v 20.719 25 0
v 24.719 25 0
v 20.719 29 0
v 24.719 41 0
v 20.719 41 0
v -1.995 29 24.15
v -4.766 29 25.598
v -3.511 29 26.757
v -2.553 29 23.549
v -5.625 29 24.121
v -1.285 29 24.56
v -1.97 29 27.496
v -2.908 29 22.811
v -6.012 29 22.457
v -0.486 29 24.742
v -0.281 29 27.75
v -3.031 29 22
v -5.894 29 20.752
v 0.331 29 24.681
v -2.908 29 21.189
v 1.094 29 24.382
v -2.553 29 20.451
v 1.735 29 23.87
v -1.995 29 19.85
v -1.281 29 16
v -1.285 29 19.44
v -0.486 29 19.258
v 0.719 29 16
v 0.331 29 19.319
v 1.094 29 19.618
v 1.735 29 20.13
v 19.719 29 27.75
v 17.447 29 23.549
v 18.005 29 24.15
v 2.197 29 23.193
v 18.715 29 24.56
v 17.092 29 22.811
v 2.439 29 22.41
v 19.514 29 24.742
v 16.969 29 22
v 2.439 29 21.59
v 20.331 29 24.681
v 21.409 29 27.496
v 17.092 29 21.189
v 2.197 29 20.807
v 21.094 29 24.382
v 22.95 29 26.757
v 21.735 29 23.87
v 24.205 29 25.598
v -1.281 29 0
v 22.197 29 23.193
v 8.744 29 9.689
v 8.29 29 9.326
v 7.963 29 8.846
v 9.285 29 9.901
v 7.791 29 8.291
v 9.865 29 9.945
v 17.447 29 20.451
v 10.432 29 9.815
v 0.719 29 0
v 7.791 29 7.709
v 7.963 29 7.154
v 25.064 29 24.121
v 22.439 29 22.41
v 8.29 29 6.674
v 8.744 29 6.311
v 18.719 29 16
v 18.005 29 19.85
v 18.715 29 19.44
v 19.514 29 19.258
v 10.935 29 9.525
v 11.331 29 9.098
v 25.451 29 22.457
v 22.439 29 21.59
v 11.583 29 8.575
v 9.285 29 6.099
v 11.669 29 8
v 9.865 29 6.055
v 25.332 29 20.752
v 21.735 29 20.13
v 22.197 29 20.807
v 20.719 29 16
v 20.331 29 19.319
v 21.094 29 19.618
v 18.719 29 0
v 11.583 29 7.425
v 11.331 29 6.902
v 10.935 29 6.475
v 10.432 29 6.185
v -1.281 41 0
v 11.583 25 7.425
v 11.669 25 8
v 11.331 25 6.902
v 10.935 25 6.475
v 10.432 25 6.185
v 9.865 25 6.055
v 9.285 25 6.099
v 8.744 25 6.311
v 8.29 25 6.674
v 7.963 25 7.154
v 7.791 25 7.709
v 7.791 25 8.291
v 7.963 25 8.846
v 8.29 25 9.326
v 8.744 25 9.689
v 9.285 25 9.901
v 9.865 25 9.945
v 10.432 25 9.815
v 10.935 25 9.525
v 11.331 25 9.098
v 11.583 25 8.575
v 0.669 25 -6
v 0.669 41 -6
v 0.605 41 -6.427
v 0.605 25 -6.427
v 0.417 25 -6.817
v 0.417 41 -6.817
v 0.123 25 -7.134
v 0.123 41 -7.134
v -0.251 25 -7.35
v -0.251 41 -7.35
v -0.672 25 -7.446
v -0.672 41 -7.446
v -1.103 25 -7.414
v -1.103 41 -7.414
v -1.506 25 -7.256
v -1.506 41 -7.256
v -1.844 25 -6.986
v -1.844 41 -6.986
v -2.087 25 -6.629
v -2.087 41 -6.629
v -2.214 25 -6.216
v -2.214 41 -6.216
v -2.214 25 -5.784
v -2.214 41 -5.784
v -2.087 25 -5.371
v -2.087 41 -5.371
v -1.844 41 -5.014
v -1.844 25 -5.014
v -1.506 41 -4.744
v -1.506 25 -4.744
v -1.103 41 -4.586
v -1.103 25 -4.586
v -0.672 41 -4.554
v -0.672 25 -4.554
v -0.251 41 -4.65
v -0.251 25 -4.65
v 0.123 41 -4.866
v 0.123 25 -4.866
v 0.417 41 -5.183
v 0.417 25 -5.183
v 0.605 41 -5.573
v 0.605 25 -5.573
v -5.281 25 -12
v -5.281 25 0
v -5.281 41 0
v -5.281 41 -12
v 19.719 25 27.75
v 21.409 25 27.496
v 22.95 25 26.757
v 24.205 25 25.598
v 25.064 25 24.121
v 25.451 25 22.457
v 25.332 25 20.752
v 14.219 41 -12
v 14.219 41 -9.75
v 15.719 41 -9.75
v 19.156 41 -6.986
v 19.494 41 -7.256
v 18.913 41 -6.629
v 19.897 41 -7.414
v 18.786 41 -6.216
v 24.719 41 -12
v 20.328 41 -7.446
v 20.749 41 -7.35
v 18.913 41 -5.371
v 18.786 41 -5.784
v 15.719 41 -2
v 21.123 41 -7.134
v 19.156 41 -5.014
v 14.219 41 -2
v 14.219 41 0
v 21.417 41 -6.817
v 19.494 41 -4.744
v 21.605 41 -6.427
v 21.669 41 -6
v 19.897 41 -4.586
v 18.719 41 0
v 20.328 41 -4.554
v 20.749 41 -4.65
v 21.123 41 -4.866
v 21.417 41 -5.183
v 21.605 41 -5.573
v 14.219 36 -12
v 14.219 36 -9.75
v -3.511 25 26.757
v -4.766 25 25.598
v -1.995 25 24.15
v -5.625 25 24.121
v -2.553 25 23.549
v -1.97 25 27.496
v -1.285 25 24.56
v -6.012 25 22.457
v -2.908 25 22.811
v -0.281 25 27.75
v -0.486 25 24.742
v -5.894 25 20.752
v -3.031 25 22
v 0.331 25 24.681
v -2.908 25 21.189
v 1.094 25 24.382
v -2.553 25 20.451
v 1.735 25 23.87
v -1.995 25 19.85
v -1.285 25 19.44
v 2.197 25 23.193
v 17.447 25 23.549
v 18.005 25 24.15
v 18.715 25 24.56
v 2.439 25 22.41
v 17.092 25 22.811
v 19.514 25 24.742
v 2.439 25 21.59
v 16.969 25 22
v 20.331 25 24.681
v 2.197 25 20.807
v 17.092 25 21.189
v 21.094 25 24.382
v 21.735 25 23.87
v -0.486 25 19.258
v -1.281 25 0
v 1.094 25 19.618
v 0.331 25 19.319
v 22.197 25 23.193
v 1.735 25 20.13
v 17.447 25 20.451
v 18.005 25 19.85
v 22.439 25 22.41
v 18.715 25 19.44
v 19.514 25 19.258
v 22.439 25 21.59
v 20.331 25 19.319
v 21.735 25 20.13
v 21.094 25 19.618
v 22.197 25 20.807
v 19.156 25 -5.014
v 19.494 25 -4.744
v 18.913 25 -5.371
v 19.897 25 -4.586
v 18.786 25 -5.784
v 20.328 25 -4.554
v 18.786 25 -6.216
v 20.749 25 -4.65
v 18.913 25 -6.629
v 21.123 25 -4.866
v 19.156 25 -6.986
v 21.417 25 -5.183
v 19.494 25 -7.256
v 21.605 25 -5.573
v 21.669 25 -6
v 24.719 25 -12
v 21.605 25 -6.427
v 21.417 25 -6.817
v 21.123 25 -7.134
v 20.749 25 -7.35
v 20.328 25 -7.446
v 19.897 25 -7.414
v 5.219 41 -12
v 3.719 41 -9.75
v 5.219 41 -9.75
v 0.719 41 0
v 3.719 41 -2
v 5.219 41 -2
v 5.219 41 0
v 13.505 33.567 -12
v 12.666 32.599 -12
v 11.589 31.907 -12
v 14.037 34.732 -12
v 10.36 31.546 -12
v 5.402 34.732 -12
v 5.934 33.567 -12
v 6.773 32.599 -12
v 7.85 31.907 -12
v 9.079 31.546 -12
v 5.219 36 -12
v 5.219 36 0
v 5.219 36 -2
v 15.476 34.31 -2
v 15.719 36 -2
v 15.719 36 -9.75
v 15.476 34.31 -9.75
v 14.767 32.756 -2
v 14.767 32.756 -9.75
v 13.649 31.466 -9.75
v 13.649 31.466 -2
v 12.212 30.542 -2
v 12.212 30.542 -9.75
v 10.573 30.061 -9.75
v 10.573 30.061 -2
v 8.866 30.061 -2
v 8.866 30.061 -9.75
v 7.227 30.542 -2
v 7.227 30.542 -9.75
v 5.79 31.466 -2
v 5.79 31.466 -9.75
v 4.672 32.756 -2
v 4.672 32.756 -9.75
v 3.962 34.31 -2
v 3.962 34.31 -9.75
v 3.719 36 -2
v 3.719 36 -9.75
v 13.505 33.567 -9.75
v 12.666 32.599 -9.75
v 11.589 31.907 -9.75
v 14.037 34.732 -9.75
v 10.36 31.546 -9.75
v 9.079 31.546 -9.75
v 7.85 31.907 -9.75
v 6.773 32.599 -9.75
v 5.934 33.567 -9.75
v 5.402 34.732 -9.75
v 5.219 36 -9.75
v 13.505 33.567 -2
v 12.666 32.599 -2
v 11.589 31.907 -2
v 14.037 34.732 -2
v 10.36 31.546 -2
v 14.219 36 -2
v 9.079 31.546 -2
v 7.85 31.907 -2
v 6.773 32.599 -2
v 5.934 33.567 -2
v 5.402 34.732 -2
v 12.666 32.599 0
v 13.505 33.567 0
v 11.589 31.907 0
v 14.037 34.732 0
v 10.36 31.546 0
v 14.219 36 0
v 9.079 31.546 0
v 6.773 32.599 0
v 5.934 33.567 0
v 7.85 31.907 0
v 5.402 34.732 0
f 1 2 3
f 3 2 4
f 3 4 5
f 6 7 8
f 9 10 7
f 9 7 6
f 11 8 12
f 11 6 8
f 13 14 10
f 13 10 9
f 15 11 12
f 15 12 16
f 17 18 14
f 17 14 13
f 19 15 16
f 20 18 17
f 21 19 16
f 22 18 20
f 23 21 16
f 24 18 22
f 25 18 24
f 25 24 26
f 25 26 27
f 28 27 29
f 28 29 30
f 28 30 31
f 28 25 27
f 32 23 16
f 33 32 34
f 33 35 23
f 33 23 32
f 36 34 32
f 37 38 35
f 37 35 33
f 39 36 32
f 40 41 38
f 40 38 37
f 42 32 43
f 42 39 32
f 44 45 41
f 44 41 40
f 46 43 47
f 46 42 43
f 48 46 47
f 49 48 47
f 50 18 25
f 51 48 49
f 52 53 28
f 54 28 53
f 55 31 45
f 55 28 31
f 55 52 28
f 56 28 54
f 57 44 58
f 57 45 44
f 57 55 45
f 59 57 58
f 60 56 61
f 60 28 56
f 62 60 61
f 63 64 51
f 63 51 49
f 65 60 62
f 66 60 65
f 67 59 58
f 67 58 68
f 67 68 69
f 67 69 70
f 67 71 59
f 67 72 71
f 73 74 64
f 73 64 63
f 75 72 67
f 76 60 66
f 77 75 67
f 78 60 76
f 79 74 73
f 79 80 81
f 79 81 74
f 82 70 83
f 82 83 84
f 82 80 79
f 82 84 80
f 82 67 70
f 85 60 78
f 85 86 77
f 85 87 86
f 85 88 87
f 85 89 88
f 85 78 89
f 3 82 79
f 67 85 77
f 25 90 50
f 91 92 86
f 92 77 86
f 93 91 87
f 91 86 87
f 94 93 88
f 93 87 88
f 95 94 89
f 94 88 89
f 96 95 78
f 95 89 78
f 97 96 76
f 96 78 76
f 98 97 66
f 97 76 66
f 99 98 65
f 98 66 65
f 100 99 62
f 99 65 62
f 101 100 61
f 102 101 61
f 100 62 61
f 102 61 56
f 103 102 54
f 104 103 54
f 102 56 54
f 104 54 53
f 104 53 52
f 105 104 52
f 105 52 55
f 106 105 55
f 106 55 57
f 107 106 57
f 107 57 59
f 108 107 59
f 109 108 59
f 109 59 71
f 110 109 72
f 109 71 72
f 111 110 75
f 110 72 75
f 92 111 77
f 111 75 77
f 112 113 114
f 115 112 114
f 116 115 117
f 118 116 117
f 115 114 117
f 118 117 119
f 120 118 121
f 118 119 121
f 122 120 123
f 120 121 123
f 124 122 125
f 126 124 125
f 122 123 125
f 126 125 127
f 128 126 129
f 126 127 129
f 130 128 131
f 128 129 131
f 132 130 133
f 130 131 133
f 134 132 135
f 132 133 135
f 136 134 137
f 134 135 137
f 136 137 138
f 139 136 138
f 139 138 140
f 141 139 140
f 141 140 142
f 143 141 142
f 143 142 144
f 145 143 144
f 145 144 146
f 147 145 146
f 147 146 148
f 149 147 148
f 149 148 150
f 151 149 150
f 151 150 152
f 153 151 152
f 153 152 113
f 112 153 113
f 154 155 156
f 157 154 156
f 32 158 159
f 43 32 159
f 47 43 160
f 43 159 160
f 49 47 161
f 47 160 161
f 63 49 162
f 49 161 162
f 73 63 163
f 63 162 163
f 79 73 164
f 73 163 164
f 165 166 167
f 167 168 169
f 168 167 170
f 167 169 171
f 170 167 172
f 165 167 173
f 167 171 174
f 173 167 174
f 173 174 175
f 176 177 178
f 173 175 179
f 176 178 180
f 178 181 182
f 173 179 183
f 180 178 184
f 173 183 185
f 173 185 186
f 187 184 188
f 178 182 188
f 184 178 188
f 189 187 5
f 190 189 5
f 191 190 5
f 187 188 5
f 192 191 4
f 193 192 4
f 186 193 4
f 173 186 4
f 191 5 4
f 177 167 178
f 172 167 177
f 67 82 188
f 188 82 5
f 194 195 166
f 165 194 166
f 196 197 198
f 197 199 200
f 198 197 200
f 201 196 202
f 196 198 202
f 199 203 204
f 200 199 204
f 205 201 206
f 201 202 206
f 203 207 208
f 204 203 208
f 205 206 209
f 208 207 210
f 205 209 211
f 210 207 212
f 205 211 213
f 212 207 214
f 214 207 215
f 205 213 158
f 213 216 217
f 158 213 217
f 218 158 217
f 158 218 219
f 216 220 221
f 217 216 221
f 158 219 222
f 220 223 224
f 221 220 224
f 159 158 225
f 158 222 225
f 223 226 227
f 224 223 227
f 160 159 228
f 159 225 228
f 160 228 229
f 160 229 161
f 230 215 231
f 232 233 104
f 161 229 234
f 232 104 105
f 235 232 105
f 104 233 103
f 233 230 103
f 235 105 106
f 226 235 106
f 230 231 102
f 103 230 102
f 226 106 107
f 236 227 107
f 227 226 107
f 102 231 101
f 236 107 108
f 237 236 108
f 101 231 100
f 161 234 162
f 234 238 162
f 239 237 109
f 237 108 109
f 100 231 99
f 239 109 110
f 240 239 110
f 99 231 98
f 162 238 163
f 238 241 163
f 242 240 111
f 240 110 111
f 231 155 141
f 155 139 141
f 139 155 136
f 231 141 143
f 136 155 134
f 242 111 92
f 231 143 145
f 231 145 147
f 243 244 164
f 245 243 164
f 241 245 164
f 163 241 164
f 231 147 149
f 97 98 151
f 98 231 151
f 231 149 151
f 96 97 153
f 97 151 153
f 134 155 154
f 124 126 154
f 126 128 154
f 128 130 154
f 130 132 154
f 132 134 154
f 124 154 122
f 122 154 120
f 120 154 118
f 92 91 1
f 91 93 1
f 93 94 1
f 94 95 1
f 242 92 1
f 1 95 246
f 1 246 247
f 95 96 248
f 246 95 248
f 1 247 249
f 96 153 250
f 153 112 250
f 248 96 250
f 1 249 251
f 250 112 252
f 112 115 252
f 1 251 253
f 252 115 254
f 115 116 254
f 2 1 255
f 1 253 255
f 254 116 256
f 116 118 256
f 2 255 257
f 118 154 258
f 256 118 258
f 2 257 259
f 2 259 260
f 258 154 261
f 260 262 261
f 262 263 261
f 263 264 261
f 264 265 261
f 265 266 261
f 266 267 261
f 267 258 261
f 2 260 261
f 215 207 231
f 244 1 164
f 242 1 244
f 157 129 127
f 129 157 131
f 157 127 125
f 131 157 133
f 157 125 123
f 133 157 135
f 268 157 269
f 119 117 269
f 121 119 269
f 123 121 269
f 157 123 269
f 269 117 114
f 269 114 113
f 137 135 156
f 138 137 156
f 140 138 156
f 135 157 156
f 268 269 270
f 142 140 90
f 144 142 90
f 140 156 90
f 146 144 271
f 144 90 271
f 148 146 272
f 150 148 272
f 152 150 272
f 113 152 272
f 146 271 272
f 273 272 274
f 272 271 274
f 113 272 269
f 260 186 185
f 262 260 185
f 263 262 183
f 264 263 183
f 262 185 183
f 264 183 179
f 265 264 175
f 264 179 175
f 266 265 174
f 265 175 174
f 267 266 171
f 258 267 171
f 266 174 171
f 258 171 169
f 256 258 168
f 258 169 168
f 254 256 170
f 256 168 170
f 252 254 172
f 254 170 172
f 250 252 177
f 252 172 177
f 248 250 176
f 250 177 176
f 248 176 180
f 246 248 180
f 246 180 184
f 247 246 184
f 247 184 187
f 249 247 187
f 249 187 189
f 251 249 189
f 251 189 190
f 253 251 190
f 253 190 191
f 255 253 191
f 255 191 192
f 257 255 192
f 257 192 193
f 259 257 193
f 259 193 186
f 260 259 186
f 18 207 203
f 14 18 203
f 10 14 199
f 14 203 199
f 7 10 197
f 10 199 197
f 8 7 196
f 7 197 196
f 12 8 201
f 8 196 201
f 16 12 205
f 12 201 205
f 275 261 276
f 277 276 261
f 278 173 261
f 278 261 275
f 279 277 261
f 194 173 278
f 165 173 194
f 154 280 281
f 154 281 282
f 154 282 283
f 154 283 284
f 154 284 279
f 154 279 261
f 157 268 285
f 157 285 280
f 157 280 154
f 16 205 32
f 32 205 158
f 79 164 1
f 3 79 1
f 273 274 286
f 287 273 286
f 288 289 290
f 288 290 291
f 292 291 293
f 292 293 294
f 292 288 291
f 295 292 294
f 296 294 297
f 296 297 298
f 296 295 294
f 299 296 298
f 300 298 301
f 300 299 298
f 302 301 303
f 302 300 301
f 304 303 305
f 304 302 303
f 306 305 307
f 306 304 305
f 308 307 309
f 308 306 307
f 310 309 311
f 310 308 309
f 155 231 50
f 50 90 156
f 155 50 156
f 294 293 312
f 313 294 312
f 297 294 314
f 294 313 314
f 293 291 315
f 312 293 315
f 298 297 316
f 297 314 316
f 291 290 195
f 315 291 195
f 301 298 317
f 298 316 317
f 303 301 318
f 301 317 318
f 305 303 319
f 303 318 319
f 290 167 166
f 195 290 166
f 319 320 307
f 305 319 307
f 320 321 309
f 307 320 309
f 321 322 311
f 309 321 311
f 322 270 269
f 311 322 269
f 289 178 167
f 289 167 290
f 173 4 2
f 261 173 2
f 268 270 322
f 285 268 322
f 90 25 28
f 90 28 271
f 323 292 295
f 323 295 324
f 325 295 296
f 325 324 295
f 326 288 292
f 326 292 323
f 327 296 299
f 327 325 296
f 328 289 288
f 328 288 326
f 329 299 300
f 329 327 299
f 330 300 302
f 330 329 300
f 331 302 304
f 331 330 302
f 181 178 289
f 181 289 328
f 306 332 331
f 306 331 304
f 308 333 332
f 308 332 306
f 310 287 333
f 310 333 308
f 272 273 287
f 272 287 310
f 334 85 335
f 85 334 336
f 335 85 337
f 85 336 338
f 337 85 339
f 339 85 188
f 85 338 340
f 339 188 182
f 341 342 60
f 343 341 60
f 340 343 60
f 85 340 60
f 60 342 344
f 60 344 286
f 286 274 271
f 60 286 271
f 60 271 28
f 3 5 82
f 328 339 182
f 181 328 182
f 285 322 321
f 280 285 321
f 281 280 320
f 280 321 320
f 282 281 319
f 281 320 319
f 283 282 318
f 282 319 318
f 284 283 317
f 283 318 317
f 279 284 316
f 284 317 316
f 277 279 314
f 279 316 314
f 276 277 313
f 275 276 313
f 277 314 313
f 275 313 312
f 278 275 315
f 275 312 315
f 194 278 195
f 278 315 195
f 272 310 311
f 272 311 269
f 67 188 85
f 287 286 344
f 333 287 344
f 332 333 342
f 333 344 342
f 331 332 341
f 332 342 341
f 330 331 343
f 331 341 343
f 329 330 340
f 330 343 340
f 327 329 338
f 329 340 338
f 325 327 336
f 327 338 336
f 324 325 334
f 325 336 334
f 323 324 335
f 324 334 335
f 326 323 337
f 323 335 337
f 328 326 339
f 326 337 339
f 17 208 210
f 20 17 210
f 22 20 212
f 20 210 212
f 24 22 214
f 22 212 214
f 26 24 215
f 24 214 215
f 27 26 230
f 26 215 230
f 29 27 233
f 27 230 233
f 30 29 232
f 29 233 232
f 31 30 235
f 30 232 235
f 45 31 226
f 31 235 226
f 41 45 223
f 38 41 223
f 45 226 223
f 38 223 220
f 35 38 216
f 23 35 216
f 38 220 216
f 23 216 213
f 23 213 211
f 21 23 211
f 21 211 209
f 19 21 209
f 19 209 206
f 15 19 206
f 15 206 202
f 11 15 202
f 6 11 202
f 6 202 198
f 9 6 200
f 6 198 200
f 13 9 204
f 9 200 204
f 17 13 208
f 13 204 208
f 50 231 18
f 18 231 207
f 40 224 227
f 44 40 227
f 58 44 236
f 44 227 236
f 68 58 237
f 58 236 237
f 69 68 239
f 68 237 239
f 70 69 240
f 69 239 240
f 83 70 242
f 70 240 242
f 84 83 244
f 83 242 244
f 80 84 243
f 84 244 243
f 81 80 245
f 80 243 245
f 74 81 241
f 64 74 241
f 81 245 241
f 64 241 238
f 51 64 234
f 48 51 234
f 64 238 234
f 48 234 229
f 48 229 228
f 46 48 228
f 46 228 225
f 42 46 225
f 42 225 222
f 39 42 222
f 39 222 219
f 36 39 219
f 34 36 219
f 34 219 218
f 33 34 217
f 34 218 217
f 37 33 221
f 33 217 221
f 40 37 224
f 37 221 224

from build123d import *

# Parameters (mm, degrees)
BOSS_EXTRUDE1_DEPTH = 12
CUT_EXTRUDE1_START  = -2
CUT_EXTRUDE1_DEPTH  = 7.75
SKETCH3_R           = 1.45
CUT_EXTRUDE2_DEPTH  = 18
SKETCH4_W           = 22
SKETCH4_H           = 4
BOSS_EXTRUDE2_DEPTH = 16
SKETCH5_R           = 1.95
CUT_EXTRUDE3_DEPTH  = 14.5
BOSS_EXTRUDE3_DEPTH = 2
BOSS_EXTRUDE4_START = -22
BOSS_EXTRUDE4_DEPTH = 2
SKETCH7_R           = 2.75
BOSS_EXTRUDE5_DEPTH = 4


with BuildPart() as part:
    # Sketch1 → Boss-Extrude1 (new body)
    with BuildSketch(Plane.XY):
        with BuildLine():
            Line((-5.280588843, 25), (-5.280588843, 41))
            Line((-5.280588843, 41), (5.219411157, 41))
            Line((5.219411157, 41), (5.219411157, 36))
            ThreePointArc((5.219411157, 36), (9.719411157, 31.5), (14.219411157, 36))
            Line((14.219411157, 36), (14.219411157, 41))
            Line((14.219411157, 41), (24.719411157, 41))
            Line((24.719411157, 41), (24.719411157, 25))
            Line((24.719411157, 25), (9.719411157, 25))
            Line((9.719411157, 25), (-5.280588843, 25))
        make_face()
    extrude(amount=-BOSS_EXTRUDE1_DEPTH)

    # Sketch2 → Cut-Extrude1 (cut)
    with BuildSketch(Plane.XY.offset(CUT_EXTRUDE1_START)):
        with BuildLine():
            Line((3.719411157, 36), (3.719411157, 41))
            Line((3.719411157, 41), (15.719411157, 41))
            Line((15.719411157, 41), (15.719411157, 36))
            ThreePointArc((15.719411157, 36), (9.719411157, 30), (3.719411157, 36))
        make_face()
    extrude(amount=-CUT_EXTRUDE1_DEPTH, mode=Mode.SUBTRACT)

    # Sketch3 → Cut-Extrude2 (cut)
    with BuildSketch(Plane(origin=(0, 41, 0), x_dir=(1, 0, 0), z_dir=(0, 1, 0))):
        with Locations((20.219411157, 6)):
            Circle(SKETCH3_R)
        with Locations((-0.780588843, 6)):
            Circle(SKETCH3_R)
    extrude(amount=-CUT_EXTRUDE2_DEPTH, mode=Mode.SUBTRACT)

    # Sketch4 → Boss-Extrude2 (add)
    with BuildSketch(Plane.XY):
        with Locations((9.719411157, 27)):
            Rectangle(SKETCH4_W, SKETCH4_H)
    extrude(amount=BOSS_EXTRUDE2_DEPTH)

    # Sketch5 → Cut-Extrude3 (cut, symmetric)
    with BuildSketch(Plane(origin=(0, 29, 0), x_dir=(1, 0, 0), z_dir=(0, 1, 0))):
        with Locations((9.719411157, -8)):
            Circle(SKETCH5_R)
    extrude(amount=CUT_EXTRUDE3_DEPTH, both=True, mode=Mode.SUBTRACT)

    # Sketch6 → Boss-Extrude3 (add)
    with BuildSketch(Plane.ZY.offset(1.280588843)):
        Polygon((16, 29), (0, 41), (0, 29), align=None)
    extrude(amount=-BOSS_EXTRUDE3_DEPTH)

    # Sketch6<2> → Boss-Extrude4 (add)
    with BuildSketch(Plane.ZY.offset(1.280588843).offset(BOSS_EXTRUDE4_START)):
        Polygon((16, 29), (0, 41), (0, 29), align=None)
    extrude(amount=BOSS_EXTRUDE4_DEPTH)

    # Sketch7 → Boss-Extrude5 (add)
    with BuildSketch(Plane(origin=(0, 25, 0), x_dir=(-1, 0, 0), z_dir=(0, -1, 0))):
        with BuildLine():
            Line((1.280588843, 0), (5.893585637, -20.752295309))
            ThreePointArc((5.893585637, -20.752295309), (4.765942897, -25.597790852), (0.280588843, -27.75))
            Line((0.280588843, -27.75), (-19.719411157, -27.75))
            ThreePointArc((-19.719411157, -27.75), (-24.204765211, -25.597790852), (-25.33240795, -20.752295309))
            Line((-25.33240795, -20.752295309), (-20.719411157, 0))
            Line((-20.719411157, 0), (-20.719411157, -16))
            Line((-20.719411157, -16), (1.280588843, -16))
            Line((1.280588843, -16), (1.280588843, 0))
        make_face()
        with Locations((0.280588843, -22)):
            Circle(SKETCH7_R, mode=Mode.SUBTRACT)
        with Locations((-19.719411157, -22)):
            Circle(SKETCH7_R, mode=Mode.SUBTRACT)
    extrude(amount=-BOSS_EXTRUDE5_DEPTH)


solid = part.part
